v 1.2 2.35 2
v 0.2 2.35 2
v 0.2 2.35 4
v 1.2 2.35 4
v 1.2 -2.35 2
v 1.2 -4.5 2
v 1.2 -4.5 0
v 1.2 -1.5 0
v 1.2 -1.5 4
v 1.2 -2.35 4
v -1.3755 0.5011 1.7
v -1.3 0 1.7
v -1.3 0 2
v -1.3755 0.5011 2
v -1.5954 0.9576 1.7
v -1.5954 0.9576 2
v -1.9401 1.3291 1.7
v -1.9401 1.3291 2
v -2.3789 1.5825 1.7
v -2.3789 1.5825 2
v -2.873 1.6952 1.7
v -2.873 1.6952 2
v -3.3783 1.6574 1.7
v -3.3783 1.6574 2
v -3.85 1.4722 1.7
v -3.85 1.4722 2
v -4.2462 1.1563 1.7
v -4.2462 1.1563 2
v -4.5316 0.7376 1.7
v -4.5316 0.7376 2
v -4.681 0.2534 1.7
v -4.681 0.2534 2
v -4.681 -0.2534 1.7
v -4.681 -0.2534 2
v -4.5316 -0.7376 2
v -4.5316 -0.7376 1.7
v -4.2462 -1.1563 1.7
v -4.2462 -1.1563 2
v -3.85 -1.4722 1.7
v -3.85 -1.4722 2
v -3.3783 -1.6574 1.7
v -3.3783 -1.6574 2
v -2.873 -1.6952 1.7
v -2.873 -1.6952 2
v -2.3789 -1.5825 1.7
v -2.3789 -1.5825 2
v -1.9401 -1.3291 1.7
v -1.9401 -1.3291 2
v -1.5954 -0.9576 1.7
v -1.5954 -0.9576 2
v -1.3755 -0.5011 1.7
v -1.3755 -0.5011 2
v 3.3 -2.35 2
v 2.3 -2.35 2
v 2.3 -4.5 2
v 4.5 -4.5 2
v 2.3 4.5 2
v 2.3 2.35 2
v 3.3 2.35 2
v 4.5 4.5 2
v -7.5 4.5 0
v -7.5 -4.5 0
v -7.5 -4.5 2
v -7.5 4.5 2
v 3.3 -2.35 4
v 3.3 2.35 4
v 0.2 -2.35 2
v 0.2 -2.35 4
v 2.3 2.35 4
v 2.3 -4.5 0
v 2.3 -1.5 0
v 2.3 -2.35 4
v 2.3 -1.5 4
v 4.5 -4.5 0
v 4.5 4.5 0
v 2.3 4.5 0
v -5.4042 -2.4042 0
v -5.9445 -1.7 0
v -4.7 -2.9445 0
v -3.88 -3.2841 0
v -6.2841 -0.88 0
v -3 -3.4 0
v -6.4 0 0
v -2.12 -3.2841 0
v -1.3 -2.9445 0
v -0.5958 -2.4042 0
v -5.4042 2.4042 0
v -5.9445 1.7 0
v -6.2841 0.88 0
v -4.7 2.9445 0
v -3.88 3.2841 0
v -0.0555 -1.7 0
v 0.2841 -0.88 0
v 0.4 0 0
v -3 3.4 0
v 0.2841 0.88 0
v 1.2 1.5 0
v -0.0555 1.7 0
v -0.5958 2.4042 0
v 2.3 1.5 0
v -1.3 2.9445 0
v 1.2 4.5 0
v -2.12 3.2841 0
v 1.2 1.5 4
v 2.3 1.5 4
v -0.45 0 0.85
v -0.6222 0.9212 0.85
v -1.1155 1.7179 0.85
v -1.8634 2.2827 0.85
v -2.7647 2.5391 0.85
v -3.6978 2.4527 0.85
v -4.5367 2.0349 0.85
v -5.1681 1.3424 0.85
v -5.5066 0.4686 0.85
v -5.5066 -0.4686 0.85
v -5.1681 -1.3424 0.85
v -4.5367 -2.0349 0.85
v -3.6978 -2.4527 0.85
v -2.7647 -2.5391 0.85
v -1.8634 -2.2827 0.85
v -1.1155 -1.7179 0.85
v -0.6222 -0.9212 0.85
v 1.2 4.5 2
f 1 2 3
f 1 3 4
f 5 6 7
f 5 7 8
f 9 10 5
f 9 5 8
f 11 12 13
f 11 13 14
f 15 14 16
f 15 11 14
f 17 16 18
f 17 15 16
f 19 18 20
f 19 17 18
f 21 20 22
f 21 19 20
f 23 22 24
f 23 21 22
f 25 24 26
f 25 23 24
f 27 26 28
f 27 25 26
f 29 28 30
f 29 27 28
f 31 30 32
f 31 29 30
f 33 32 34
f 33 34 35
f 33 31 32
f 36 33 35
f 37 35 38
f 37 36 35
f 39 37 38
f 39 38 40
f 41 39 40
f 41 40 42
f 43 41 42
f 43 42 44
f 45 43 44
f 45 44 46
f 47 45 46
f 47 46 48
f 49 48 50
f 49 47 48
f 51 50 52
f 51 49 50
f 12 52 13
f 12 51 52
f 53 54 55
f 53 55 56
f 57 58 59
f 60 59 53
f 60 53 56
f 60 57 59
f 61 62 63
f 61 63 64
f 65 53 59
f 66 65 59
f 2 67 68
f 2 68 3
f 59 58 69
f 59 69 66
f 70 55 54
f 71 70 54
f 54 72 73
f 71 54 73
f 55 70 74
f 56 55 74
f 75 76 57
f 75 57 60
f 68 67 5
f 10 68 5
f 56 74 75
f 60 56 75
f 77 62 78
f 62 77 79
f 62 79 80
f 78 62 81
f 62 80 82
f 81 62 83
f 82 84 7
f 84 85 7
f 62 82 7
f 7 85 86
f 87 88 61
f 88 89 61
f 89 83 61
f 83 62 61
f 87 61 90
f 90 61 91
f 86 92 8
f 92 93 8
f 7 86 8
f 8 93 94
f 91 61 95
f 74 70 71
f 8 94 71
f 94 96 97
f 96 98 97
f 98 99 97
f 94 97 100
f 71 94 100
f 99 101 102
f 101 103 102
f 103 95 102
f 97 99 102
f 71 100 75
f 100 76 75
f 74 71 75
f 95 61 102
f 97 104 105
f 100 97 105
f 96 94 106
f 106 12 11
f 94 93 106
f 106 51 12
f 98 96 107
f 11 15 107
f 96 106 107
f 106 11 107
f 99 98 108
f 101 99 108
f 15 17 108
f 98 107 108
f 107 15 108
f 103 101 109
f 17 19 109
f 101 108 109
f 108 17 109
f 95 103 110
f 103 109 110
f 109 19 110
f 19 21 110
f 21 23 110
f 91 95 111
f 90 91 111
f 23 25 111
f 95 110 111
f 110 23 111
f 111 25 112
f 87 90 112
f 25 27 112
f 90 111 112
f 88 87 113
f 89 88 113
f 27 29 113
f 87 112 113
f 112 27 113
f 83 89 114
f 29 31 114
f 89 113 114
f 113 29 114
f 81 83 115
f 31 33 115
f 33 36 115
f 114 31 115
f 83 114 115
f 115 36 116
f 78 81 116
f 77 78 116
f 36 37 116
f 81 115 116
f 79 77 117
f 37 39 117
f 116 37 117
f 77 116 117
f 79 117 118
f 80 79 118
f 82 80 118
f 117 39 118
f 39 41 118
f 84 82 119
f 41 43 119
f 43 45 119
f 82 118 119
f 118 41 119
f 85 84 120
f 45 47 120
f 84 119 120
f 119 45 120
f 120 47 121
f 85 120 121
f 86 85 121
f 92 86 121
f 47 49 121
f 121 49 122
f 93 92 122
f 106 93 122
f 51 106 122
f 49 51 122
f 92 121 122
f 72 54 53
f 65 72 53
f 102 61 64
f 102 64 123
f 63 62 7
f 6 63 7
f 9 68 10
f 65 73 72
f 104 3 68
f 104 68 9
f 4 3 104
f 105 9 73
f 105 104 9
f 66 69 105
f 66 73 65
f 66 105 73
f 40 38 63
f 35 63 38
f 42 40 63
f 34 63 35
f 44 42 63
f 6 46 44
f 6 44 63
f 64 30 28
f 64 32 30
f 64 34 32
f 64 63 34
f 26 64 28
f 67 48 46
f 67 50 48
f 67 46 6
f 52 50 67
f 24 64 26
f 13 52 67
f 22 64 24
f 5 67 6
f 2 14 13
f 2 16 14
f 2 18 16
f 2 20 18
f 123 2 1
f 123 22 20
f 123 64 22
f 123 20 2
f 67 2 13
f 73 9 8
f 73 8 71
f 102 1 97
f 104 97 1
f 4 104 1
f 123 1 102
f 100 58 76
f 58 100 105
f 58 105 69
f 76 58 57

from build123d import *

# Parameters (mm, degrees)
SKETCH_W     = 12
SKETCH_H     = 9
SKETCH_R     = 1.7
PAD_DEPTH    = 2
SKETCH001_W  = 3.1
SKETCH001_H  = 4.7
PAD001_DEPTH = 2
SKETCH002_W  = 1.1
SKETCH002_H  = 5
POCKET_DEPTH = 4.001
CHAMFER_SIZE = 1.7


with BuildPart() as part:
    # Sketch → Pad (new body)
    with BuildSketch(Plane.XY):
        with Locations((-1.5, 0)):
            Rectangle(SKETCH_W, SKETCH_H)
        with Locations((-3, 0)):
            Circle(SKETCH_R, mode=Mode.SUBTRACT)
    extrude(amount=PAD_DEPTH)

    # Sketch001 → Pad001 (new body)
    with BuildSketch(Plane.XY.offset(2)):
        with Locations((1.75, 0)):
            Rectangle(SKETCH001_W, SKETCH001_H)
    extrude(amount=PAD001_DEPTH)

    # Sketch002 → Pocket (cut, through all)
    with BuildSketch(Plane.XY.offset(4)):
        with Locations((1.75, 4)):
            Rectangle(SKETCH002_W, SKETCH002_H)
        with Locations((1.75, -4)):
            Rectangle(SKETCH002_W, SKETCH002_H)
    extrude(amount=-POCKET_DEPTH, mode=Mode.SUBTRACT)

    # Chamfer
    chamfer_edges = [part.edges().sort_by_distance(p)[0] for p in [
        (-4.7, 0, 0),
    ]]
    chamfer(chamfer_edges, length=CHAMFER_SIZE)


solid = part.part
